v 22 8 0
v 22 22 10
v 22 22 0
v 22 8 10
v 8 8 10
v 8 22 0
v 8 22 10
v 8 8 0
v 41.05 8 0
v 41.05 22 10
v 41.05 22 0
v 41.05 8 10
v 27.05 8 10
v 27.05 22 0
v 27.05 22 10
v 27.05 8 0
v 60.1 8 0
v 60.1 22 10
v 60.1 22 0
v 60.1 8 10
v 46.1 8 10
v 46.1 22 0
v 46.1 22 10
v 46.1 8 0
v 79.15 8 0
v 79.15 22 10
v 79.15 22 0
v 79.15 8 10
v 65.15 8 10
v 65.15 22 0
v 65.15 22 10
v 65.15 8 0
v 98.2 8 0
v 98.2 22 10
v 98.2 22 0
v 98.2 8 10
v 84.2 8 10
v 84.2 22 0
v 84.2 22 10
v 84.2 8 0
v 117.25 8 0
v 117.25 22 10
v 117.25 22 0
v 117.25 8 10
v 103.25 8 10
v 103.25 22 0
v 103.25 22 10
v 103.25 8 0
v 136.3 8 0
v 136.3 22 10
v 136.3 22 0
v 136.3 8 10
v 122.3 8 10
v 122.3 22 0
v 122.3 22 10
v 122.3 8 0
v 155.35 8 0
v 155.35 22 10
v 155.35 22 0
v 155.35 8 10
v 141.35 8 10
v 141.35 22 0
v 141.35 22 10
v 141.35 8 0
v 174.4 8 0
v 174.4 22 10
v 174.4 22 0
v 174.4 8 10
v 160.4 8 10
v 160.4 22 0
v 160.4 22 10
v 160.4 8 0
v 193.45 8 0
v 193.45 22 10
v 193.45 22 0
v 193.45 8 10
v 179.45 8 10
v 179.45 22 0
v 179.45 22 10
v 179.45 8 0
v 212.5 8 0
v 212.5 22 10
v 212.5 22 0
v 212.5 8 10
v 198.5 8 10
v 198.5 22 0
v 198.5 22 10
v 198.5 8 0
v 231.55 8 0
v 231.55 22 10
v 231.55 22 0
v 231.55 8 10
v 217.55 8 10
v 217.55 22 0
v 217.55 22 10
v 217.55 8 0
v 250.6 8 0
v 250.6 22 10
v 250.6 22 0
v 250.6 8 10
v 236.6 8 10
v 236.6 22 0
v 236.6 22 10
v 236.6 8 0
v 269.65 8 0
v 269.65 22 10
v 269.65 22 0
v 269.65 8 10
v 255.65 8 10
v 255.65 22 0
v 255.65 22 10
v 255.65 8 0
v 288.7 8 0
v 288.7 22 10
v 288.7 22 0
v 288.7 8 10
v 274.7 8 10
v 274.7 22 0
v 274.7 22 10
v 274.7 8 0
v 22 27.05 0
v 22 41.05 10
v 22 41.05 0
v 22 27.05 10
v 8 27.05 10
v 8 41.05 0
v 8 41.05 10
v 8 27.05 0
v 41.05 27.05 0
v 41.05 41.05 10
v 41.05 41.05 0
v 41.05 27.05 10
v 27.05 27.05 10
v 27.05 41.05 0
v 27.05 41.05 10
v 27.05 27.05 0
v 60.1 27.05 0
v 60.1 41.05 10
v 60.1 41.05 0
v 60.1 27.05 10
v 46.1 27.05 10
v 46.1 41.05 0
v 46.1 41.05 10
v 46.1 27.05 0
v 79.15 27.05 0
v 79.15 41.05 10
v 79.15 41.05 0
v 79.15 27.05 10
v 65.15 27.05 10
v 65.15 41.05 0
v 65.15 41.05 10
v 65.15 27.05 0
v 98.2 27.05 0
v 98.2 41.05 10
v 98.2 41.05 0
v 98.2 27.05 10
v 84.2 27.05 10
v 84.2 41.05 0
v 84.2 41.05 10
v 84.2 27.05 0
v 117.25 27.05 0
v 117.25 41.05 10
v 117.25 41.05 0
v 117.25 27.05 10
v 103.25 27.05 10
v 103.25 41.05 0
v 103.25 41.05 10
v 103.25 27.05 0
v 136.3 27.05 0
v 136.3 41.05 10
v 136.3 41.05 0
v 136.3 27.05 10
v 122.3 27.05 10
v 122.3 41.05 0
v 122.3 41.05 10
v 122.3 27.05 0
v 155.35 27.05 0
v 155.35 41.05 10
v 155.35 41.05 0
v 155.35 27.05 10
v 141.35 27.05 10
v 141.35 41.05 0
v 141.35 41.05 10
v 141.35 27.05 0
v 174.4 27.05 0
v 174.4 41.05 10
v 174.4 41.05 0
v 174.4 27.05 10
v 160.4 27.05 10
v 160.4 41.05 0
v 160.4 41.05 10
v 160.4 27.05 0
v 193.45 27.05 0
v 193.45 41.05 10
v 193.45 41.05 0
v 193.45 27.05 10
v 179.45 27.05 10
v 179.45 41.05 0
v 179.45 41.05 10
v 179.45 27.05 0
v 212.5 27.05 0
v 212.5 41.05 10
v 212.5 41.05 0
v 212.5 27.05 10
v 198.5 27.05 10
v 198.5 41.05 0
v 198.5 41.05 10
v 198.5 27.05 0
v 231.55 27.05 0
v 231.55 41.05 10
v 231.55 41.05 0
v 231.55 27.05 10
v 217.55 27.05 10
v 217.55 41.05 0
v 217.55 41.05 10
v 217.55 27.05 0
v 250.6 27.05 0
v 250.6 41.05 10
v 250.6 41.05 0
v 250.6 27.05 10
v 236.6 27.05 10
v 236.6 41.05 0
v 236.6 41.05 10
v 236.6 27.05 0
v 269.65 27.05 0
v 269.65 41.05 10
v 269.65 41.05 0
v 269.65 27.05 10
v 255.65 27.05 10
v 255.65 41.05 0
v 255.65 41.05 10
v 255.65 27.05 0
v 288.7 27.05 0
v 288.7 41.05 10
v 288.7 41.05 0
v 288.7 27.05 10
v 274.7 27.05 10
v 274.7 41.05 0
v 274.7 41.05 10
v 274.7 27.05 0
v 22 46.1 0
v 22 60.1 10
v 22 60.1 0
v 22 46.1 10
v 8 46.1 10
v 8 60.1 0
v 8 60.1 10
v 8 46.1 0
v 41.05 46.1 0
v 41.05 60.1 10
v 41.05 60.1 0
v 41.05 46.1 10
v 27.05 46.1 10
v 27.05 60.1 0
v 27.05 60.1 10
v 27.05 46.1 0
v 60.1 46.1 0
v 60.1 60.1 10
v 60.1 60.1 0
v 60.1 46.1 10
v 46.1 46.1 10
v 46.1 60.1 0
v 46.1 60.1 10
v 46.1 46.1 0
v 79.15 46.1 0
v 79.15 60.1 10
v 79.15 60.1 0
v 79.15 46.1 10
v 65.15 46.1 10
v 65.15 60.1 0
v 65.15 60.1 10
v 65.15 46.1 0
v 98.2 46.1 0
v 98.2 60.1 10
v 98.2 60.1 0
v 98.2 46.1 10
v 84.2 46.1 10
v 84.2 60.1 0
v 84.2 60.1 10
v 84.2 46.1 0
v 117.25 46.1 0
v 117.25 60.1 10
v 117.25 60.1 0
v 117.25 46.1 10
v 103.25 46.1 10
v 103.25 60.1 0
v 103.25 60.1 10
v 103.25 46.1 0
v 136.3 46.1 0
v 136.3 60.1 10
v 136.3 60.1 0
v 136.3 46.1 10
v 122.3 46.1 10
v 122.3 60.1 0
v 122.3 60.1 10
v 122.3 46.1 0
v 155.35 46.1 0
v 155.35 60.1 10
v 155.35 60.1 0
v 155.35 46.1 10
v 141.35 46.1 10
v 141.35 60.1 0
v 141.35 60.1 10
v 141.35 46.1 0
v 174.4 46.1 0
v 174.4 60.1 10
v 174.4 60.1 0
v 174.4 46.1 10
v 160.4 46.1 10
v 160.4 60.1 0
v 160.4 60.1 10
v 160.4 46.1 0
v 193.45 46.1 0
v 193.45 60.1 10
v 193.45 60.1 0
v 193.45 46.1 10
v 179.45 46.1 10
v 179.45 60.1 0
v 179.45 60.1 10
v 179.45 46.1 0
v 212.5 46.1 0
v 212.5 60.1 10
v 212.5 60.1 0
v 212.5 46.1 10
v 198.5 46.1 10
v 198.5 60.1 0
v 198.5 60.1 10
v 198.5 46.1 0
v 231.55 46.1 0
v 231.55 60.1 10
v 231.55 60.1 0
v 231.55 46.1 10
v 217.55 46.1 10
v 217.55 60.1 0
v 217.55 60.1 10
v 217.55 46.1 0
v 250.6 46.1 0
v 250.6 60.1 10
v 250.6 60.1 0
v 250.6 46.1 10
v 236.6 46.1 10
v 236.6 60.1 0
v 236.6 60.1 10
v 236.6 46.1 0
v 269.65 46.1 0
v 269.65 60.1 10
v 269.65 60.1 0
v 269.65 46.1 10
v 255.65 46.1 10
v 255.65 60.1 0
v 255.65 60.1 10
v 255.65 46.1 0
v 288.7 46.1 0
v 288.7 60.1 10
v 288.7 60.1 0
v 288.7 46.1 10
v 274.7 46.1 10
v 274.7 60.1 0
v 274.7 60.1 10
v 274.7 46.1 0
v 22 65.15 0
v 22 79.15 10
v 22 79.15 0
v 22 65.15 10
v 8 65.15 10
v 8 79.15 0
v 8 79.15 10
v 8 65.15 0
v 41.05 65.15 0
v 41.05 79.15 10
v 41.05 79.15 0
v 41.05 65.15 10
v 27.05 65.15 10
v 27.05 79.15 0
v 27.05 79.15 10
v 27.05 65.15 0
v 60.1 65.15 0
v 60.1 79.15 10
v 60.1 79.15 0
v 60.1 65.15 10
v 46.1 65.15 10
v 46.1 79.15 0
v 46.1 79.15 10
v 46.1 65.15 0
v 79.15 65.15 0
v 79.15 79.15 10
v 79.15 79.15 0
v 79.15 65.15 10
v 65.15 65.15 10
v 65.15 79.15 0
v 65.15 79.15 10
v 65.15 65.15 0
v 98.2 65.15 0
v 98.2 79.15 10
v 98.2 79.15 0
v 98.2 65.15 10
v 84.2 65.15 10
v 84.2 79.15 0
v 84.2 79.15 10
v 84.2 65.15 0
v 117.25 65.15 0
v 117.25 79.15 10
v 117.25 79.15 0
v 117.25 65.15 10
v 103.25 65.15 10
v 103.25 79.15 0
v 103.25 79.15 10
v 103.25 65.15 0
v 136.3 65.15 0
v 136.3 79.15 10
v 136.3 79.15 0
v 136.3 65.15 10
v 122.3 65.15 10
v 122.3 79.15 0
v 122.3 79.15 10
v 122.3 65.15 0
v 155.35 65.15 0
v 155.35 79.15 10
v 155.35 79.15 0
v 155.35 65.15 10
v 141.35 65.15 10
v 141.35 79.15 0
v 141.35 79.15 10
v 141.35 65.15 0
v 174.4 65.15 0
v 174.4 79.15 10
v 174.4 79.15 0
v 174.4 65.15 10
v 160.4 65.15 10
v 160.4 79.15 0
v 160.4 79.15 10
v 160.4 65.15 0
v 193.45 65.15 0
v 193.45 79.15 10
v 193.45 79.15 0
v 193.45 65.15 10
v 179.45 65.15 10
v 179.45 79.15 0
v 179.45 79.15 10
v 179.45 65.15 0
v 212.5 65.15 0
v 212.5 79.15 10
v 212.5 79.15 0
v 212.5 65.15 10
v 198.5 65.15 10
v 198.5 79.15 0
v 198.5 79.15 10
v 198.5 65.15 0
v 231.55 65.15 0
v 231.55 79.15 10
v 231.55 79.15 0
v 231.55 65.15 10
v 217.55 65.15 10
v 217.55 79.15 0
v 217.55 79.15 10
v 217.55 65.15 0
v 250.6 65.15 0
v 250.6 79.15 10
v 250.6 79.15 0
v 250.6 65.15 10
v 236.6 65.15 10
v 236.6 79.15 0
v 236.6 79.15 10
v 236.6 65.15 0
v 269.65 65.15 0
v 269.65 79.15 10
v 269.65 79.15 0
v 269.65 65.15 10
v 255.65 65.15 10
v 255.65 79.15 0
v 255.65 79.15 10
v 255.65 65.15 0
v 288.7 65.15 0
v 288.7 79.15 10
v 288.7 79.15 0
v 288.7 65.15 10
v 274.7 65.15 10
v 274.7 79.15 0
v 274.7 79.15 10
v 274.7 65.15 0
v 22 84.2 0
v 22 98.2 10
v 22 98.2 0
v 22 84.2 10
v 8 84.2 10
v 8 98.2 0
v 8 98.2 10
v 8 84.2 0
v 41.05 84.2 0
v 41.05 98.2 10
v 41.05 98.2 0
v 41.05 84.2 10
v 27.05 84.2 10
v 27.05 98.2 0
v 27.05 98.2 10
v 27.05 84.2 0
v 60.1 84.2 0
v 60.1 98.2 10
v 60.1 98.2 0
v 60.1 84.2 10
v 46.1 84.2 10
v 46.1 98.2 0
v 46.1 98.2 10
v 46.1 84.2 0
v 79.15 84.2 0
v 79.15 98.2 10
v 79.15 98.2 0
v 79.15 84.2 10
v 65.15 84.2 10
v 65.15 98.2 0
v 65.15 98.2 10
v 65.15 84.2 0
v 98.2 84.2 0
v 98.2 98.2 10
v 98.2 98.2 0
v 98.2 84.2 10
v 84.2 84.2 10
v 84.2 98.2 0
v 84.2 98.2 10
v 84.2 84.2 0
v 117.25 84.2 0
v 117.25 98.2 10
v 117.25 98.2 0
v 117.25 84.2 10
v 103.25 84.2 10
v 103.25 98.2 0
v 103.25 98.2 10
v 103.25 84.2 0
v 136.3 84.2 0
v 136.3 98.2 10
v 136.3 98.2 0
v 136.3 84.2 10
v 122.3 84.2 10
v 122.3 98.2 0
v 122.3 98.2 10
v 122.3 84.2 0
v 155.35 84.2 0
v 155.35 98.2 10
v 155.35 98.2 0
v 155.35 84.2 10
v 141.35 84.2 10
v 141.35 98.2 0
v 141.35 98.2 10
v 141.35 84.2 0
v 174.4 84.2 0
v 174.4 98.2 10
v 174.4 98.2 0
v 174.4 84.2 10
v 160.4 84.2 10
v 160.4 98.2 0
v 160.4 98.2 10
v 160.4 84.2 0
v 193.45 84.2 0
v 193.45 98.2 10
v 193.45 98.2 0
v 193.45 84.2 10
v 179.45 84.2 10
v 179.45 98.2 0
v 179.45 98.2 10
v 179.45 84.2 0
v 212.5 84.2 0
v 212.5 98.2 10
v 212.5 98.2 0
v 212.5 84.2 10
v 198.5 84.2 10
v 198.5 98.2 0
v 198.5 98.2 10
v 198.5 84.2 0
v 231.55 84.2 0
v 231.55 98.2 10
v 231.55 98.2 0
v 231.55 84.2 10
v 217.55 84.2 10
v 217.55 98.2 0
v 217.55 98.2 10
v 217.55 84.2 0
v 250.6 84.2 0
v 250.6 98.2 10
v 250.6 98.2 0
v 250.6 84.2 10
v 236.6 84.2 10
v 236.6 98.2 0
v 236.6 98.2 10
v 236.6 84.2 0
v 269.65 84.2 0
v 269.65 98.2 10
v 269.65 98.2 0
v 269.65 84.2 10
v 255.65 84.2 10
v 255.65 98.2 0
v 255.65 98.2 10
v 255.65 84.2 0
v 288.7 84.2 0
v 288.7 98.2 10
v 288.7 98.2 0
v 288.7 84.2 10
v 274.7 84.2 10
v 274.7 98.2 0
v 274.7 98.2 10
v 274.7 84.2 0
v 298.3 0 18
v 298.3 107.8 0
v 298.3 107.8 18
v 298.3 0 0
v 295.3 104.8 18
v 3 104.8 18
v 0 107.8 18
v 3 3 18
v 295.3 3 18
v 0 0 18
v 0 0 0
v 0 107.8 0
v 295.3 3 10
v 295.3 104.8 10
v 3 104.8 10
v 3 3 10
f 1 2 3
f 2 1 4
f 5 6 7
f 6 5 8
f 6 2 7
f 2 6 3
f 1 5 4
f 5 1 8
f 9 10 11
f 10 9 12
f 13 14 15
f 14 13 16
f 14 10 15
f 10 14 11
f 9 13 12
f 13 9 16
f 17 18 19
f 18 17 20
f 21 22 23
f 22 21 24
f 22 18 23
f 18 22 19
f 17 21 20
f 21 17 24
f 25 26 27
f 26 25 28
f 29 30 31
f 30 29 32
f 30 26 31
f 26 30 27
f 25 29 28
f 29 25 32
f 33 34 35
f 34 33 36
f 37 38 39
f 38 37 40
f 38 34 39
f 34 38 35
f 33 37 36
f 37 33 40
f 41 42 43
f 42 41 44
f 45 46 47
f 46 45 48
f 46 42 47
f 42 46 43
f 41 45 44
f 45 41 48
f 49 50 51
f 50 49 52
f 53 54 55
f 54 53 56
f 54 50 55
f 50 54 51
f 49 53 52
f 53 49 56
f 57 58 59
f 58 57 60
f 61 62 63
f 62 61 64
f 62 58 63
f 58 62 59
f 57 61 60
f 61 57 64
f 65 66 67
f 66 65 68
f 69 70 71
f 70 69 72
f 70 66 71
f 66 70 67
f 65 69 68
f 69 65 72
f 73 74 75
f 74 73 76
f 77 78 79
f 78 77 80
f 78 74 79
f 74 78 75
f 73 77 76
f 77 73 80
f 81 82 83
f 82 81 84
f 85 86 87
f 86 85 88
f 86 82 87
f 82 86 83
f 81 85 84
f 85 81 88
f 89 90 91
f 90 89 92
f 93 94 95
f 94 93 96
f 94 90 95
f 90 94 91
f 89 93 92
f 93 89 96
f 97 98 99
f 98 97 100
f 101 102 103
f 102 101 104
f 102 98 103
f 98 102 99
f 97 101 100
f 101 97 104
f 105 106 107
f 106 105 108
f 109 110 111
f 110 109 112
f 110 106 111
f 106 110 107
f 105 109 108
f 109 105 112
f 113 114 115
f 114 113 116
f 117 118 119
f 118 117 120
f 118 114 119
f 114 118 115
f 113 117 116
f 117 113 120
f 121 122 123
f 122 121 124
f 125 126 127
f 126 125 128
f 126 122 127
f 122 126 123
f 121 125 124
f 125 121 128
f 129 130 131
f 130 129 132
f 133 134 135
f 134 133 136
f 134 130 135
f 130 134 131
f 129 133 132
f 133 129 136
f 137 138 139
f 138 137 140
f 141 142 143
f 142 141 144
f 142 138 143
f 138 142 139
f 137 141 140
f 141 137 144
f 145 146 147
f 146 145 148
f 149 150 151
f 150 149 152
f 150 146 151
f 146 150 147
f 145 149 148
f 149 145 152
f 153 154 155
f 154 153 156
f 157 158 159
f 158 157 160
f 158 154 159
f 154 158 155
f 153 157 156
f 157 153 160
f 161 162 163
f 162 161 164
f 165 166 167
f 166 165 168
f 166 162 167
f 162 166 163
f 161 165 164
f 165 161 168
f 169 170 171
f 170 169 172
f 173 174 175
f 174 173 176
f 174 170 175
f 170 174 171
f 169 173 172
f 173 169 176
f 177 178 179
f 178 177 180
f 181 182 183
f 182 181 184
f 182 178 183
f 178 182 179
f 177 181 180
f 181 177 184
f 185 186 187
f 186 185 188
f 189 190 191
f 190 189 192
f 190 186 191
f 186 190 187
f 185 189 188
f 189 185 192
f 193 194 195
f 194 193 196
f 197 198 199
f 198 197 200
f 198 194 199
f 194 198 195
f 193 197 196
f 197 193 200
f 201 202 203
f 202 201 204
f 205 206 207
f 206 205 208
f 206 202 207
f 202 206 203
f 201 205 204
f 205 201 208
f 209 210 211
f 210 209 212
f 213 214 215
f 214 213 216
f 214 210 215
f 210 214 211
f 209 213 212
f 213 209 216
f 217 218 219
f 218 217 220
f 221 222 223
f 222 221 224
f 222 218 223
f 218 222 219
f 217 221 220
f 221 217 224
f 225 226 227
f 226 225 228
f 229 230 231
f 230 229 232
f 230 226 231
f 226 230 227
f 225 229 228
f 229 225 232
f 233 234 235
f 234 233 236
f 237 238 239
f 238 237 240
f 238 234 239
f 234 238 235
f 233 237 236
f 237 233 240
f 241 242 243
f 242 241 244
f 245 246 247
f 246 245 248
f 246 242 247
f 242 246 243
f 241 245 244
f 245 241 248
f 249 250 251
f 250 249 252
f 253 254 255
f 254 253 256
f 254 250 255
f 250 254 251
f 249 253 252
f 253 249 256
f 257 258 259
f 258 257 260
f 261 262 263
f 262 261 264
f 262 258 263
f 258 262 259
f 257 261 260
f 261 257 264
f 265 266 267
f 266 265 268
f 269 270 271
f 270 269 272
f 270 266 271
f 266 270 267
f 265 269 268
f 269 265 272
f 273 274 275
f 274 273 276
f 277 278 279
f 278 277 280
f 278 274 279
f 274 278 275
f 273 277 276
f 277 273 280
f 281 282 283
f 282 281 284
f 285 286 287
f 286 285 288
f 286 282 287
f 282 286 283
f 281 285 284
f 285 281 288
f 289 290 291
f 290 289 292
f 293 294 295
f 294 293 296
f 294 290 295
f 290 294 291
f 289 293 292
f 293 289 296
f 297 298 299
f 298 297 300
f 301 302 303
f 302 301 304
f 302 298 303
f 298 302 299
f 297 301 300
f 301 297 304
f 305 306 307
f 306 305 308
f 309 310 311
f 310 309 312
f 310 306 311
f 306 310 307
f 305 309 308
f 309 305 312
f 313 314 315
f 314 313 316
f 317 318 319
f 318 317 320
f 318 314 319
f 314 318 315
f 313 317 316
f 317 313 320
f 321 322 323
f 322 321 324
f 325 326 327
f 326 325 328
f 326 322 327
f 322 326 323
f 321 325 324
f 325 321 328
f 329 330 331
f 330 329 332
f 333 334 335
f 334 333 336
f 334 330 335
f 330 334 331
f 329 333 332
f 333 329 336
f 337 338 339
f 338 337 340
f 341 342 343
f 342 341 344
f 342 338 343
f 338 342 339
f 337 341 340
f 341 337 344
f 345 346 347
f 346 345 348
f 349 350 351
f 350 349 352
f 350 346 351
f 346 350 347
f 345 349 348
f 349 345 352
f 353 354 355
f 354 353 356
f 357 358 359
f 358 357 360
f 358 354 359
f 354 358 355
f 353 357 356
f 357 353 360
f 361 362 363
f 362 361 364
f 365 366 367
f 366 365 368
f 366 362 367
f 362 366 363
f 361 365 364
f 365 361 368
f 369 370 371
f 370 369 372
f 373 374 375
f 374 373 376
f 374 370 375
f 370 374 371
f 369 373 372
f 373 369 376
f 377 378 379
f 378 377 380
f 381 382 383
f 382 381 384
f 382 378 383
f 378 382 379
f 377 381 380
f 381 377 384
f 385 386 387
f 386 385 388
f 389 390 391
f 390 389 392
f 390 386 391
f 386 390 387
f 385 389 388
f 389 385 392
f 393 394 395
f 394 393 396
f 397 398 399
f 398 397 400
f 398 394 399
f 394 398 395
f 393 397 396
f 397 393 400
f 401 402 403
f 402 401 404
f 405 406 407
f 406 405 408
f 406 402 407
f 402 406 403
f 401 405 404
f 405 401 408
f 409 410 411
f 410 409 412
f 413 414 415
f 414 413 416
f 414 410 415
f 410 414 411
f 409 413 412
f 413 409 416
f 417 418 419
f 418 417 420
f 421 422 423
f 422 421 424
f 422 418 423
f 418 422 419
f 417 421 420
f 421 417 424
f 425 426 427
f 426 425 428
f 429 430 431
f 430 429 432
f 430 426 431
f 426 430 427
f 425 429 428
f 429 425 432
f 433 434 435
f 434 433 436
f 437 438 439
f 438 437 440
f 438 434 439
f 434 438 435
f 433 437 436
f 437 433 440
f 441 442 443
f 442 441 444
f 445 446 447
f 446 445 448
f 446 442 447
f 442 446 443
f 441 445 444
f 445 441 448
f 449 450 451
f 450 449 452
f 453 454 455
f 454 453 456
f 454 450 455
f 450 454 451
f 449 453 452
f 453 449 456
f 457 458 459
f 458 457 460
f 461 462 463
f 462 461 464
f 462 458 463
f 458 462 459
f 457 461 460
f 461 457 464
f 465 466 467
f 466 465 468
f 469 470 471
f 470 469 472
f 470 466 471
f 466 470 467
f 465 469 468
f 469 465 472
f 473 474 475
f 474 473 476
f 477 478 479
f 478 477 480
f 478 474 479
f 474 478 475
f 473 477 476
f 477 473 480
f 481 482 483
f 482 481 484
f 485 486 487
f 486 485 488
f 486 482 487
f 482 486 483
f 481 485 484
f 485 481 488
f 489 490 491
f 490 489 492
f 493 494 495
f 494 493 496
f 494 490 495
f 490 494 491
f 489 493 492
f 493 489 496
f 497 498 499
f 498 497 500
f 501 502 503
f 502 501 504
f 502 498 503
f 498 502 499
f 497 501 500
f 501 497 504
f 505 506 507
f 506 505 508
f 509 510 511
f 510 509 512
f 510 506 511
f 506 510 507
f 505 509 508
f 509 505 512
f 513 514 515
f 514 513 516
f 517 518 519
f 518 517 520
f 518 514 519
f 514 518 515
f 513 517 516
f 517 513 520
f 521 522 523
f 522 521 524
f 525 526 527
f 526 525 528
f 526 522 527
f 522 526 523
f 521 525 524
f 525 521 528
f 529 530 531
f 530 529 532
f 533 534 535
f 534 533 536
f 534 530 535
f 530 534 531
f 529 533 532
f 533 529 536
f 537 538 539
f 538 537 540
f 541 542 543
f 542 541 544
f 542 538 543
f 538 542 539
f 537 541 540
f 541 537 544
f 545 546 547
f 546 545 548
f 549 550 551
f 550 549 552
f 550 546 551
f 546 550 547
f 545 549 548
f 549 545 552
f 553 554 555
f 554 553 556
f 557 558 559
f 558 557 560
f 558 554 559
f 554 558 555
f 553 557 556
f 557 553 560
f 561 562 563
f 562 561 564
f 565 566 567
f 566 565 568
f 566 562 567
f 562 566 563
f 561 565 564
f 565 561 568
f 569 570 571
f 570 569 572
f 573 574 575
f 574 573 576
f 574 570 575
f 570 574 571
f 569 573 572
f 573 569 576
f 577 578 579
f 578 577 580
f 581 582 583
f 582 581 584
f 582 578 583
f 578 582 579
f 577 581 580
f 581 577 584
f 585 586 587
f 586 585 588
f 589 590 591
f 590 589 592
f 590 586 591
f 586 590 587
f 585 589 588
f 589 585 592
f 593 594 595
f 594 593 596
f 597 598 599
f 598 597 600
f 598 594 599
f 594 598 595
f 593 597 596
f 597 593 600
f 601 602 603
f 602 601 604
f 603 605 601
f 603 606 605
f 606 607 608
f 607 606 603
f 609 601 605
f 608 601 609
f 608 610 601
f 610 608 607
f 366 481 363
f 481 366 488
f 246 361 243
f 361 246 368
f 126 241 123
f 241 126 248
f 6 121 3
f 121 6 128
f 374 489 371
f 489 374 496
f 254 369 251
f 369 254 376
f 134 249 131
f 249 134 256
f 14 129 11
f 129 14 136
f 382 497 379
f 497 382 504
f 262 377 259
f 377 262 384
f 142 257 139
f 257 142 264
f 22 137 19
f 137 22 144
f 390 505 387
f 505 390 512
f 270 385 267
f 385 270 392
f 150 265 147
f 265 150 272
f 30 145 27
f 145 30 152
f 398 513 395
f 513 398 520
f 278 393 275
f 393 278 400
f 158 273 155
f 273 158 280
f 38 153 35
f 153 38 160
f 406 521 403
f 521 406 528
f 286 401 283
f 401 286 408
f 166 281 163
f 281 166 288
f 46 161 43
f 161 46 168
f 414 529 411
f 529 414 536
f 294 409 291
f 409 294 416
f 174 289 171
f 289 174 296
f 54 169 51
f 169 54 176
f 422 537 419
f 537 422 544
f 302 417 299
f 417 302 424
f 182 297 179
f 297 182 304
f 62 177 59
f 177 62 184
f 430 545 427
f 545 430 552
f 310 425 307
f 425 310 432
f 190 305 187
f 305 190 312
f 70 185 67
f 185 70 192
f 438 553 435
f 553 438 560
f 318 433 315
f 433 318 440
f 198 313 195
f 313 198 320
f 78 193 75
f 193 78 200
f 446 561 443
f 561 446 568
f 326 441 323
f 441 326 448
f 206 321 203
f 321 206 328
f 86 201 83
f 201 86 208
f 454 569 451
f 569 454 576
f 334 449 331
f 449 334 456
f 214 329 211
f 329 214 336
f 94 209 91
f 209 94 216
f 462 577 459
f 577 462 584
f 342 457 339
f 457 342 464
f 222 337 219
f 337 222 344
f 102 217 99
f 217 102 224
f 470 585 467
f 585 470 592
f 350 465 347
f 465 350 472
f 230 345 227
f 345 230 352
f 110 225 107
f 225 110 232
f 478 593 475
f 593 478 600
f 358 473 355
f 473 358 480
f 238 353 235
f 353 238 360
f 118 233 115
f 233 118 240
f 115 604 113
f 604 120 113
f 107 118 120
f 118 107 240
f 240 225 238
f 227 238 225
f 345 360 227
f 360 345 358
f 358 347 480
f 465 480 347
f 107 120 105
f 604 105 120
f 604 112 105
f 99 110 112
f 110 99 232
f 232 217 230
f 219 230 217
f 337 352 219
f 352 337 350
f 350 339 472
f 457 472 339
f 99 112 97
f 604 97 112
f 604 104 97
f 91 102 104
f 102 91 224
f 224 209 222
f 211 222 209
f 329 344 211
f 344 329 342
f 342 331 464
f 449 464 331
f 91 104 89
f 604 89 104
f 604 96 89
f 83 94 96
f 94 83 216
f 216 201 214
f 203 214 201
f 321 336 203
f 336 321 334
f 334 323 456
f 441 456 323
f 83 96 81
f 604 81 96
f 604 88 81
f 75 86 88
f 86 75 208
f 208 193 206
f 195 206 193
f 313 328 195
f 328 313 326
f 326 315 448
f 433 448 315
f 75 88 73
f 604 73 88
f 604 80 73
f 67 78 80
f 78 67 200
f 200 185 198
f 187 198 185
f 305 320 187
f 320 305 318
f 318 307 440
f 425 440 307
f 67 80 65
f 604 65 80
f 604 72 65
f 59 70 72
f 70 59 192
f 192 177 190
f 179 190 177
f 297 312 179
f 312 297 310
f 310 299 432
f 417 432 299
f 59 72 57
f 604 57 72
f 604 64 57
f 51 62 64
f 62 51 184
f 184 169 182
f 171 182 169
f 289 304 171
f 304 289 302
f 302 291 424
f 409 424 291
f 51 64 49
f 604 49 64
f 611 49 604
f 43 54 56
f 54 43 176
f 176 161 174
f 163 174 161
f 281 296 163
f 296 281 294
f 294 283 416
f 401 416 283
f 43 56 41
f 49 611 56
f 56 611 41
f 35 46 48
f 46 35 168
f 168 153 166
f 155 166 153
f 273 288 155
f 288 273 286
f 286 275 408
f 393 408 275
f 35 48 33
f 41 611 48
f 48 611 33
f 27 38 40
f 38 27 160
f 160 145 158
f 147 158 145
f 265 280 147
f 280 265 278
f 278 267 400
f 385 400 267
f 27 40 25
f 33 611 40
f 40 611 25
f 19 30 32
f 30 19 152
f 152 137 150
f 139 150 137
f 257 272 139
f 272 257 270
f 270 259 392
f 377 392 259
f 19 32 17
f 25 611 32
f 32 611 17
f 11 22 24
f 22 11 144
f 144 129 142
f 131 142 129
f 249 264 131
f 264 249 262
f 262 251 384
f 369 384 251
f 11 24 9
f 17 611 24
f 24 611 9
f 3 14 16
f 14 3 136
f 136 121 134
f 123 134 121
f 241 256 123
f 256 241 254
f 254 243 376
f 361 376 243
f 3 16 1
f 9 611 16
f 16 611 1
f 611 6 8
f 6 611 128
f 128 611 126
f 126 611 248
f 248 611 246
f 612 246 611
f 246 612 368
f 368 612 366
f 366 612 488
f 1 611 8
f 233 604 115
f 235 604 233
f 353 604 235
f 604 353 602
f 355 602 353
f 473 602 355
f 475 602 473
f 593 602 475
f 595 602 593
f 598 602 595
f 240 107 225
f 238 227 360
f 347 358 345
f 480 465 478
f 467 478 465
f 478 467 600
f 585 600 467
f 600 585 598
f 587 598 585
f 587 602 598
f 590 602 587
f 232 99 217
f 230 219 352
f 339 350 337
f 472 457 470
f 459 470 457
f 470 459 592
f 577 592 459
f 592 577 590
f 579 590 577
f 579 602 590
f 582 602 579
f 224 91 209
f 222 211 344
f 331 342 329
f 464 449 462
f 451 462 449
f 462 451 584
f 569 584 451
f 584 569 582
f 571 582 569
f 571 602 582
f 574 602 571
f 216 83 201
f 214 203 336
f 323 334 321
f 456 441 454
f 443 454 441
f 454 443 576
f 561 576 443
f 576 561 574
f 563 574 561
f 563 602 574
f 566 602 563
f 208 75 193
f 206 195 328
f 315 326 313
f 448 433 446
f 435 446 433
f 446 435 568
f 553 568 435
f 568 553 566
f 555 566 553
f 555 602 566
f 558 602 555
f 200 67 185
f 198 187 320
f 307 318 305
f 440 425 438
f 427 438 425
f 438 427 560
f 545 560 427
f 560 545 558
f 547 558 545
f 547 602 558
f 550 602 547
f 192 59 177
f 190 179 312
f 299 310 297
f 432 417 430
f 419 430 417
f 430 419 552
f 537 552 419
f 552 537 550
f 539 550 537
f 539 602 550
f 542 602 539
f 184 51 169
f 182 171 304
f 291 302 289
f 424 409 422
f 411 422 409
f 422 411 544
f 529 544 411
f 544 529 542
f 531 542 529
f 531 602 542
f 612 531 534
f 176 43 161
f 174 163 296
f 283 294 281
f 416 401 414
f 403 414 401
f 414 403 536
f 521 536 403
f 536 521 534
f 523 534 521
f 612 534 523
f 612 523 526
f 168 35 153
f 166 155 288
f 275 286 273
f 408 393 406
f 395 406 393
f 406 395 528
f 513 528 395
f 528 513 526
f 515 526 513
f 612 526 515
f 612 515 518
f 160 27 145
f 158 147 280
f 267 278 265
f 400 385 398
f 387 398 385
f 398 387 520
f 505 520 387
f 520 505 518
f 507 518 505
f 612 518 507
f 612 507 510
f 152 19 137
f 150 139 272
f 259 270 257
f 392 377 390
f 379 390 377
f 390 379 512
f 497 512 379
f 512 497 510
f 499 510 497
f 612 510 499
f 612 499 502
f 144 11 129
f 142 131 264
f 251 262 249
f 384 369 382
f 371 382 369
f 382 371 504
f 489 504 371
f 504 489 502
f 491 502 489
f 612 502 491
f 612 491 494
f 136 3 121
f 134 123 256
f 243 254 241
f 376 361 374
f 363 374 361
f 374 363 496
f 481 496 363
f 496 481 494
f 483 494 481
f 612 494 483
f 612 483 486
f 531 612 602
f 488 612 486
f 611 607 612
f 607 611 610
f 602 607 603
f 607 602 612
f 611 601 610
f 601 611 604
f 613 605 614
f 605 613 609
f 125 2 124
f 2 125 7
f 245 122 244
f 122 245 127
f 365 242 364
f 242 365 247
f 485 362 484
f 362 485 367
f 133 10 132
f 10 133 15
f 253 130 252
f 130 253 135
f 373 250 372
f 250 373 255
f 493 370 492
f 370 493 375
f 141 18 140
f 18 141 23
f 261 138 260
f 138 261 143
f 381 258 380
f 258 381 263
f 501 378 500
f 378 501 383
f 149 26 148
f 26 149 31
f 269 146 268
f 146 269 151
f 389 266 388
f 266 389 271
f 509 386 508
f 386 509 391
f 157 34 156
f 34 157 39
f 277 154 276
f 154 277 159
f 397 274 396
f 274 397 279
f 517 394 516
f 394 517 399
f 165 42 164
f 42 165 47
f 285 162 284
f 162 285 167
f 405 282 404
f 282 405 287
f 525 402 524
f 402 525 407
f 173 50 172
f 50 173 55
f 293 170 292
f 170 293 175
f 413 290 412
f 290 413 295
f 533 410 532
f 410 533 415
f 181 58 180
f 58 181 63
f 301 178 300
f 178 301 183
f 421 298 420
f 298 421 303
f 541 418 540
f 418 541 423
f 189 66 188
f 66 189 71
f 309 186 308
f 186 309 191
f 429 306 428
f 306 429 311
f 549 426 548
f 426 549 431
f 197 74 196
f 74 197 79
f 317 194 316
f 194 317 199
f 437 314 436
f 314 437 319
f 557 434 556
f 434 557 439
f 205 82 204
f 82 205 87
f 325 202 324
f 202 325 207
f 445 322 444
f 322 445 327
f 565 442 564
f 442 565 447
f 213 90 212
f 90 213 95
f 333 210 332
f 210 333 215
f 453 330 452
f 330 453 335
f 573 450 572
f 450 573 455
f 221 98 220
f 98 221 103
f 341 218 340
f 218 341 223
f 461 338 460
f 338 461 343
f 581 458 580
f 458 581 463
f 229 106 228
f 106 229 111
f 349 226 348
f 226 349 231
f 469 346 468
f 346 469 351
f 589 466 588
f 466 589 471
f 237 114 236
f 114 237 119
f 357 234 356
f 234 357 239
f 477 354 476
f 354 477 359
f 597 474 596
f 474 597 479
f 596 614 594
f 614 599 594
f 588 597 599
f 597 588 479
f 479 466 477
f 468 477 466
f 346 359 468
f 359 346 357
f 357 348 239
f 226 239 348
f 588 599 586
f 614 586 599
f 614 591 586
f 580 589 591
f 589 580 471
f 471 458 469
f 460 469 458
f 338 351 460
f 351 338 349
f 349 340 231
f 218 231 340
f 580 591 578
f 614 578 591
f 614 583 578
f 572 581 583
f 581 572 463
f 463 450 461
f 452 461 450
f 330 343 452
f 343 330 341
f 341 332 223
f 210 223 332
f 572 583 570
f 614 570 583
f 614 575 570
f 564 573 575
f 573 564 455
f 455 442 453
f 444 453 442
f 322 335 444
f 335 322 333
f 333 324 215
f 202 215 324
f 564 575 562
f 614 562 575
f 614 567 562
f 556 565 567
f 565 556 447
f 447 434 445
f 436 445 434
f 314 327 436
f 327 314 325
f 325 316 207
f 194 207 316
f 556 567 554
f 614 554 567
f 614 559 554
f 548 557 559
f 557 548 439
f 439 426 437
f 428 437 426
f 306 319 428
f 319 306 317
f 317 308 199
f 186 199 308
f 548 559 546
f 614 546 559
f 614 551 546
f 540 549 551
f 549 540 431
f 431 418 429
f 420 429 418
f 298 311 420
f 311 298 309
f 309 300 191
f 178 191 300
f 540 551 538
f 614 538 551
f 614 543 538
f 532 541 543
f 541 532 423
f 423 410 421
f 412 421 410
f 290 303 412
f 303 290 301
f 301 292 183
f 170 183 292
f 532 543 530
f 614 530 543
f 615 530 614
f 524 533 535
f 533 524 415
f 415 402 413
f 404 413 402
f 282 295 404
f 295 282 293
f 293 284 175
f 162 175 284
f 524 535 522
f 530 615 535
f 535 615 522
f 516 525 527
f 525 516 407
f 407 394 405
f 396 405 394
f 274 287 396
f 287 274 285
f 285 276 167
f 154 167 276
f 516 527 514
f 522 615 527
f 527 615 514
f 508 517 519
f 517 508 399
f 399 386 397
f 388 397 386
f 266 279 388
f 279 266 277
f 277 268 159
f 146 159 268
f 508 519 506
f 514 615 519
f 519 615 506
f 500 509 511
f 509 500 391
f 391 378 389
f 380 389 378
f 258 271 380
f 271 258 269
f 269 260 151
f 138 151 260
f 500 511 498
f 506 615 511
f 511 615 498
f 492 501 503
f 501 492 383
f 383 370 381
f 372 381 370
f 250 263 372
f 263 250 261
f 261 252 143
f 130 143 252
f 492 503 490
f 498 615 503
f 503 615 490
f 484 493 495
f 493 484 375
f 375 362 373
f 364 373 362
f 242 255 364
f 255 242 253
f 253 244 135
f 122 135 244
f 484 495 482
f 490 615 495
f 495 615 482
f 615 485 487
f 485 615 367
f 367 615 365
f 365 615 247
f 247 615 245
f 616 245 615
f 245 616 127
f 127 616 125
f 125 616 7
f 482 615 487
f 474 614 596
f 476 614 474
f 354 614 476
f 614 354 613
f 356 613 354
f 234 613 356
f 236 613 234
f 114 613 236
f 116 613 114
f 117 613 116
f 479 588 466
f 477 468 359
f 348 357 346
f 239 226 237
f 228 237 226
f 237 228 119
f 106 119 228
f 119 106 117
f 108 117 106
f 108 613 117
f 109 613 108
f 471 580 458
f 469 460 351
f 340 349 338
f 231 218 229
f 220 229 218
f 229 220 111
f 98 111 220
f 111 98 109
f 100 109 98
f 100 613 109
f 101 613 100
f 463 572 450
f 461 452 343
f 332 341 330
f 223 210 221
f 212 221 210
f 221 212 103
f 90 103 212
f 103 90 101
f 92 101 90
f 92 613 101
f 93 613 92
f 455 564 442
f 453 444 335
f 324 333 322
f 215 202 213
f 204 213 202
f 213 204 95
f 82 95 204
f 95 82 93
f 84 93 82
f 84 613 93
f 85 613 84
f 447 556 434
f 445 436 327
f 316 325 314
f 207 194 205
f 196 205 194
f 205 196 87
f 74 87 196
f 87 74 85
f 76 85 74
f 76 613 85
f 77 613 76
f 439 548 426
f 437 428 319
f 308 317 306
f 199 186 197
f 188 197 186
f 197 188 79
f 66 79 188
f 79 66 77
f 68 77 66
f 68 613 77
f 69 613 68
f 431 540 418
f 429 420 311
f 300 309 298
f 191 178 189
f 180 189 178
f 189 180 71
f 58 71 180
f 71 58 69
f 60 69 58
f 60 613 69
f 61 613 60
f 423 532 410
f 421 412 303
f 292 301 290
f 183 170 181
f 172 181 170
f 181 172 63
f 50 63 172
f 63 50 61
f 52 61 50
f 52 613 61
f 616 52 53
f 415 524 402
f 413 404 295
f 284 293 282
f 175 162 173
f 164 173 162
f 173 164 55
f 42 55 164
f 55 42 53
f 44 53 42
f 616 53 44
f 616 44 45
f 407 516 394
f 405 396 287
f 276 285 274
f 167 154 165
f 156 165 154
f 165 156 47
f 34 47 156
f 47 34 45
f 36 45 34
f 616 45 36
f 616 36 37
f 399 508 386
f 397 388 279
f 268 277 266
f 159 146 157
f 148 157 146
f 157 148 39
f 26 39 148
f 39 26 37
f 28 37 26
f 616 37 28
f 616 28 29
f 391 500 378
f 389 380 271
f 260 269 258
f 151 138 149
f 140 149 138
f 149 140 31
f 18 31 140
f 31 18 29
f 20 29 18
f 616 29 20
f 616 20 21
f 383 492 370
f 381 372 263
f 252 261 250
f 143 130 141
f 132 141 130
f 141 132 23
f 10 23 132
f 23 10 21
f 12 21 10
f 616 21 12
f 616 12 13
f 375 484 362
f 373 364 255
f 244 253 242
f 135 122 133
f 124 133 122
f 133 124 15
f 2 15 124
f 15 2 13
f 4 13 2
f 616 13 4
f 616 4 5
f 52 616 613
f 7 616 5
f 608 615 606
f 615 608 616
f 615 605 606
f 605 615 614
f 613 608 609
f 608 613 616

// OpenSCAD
// Generated keyboard case
// Layout: 5x15
// Switch type: Cherry MX
// Optimization: none

// Parameters
case_width = 298.30;
case_height = 107.80;
case_depth = 18.00;
wall_thickness = 3.00;
base_height = 10.00;
switch_cutout_size = 14.00;
key_spacing = 19.05;

module keyboard_case() {
    difference() {
        // Outer shell
        translate([0, 0, 0])
            cube([case_width, case_height, case_depth]);

        // Inner cavity
        translate([wall_thickness, wall_thickness, base_height])
            cube([case_width - 2*wall_thickness, 
                  case_height - 2*wall_thickness, 
                  case_depth - base_height + 1]);

        // Switch cutouts
        translate([wall_thickness + 5 - 0.00, wall_thickness + 5 - 0.00, -1])
            switch_plate();
    }
}

module switch_plate() {
    translate([0.00, 0.00, 0])
        cube([switch_cutout_size, switch_cutout_size, base_height + 2]);
    translate([19.05, 0.00, 0])
        cube([switch_cutout_size, switch_cutout_size, base_height + 2]);
    translate([38.10, 0.00, 0])
        cube([switch_cutout_size, switch_cutout_size, base_height + 2]);
    translate([57.15, 0.00, 0])
        cube([switch_cutout_size, switch_cutout_size, base_height + 2]);
    translate([76.20, 0.00, 0])
        cube([switch_cutout_size, switch_cutout_size, base_height + 2]);
    translate([95.25, 0.00, 0])
        cube([switch_cutout_size, switch_cutout_size, base_height + 2]);
    translate([114.30, 0.00, 0])
        cube([switch_cutout_size, switch_cutout_size, base_height + 2]);
    translate([133.35, 0.00, 0])
        cube([switch_cutout_size, switch_cutout_size, base_height + 2]);
    translate([152.40, 0.00, 0])
        cube([switch_cutout_size, switch_cutout_size, base_height + 2]);
    translate([171.45, 0.00, 0])
        cube([switch_cutout_size, switch_cutout_size, base_height + 2]);
    translate([190.50, 0.00, 0])
        cube([switch_cutout_size, switch_cutout_size, base_height + 2]);
    translate([209.55, 0.00, 0])
        cube([switch_cutout_size, switch_cutout_size, base_height + 2]);
    translate([228.60, 0.00, 0])
        cube([switch_cutout_size, switch_cutout_size, base_height + 2]);
    translate([247.65, 0.00, 0])
        cube([switch_cutout_size, switch_cutout_size, base_height + 2]);
    translate([266.70, 0.00, 0])
        cube([switch_cutout_size, switch_cutout_size, base_height + 2]);
    translate([0.00, 19.05, 0])
        cube([switch_cutout_size, switch_cutout_size, base_height + 2]);
    translate([19.05, 19.05, 0])
        cube([switch_cutout_size, switch_cutout_size, base_height + 2]);
    translate([38.10, 19.05, 0])
        cube([switch_cutout_size, switch_cutout_size, base_height + 2]);
    translate([57.15, 19.05, 0])
        cube([switch_cutout_size, switch_cutout_size, base_height + 2]);
    translate([76.20, 19.05, 0])
        cube([switch_cutout_size, switch_cutout_size, base_height + 2]);
    translate([95.25, 19.05, 0])
        cube([switch_cutout_size, switch_cutout_size, base_height + 2]);
    translate([114.30, 19.05, 0])
        cube([switch_cutout_size, switch_cutout_size, base_height + 2]);
    translate([133.35, 19.05, 0])
        cube([switch_cutout_size, switch_cutout_size, base_height + 2]);
    translate([152.40, 19.05, 0])
        cube([switch_cutout_size, switch_cutout_size, base_height + 2]);
    translate([171.45, 19.05, 0])
        cube([switch_cutout_size, switch_cutout_size, base_height + 2]);
    translate([190.50, 19.05, 0])
        cube([switch_cutout_size, switch_cutout_size, base_height + 2]);
    translate([209.55, 19.05, 0])
        cube([switch_cutout_size, switch_cutout_size, base_height + 2]);
    translate([228.60, 19.05, 0])
        cube([switch_cutout_size, switch_cutout_size, base_height + 2]);
    translate([247.65, 19.05, 0])
        cube([switch_cutout_size, switch_cutout_size, base_height + 2]);
    translate([266.70, 19.05, 0])
        cube([switch_cutout_size, switch_cutout_size, base_height + 2]);
    translate([0.00, 38.10, 0])
        cube([switch_cutout_size, switch_cutout_size, base_height + 2]);
    translate([19.05, 38.10, 0])
        cube([switch_cutout_size, switch_cutout_size, base_height + 2]);
    translate([38.10, 38.10, 0])
        cube([switch_cutout_size, switch_cutout_size, base_height + 2]);
    translate([57.15, 38.10, 0])
        cube([switch_cutout_size, switch_cutout_size, base_height + 2]);
    translate([76.20, 38.10, 0])
        cube([switch_cutout_size, switch_cutout_size, base_height + 2]);
    translate([95.25, 38.10, 0])
        cube([switch_cutout_size, switch_cutout_size, base_height + 2]);
    translate([114.30, 38.10, 0])
        cube([switch_cutout_size, switch_cutout_size, base_height + 2]);
    translate([133.35, 38.10, 0])
        cube([switch_cutout_size, switch_cutout_size, base_height + 2]);
    translate([152.40, 38.10, 0])
        cube([switch_cutout_size, switch_cutout_size, base_height + 2]);
    translate([171.45, 38.10, 0])
        cube([switch_cutout_size, switch_cutout_size, base_height + 2]);
    translate([190.50, 38.10, 0])
        cube([switch_cutout_size, switch_cutout_size, base_height + 2]);
    translate([209.55, 38.10, 0])
        cube([switch_cutout_size, switch_cutout_size, base_height + 2]);
    translate([228.60, 38.10, 0])
        cube([switch_cutout_size, switch_cutout_size, base_height + 2]);
    translate([247.65, 38.10, 0])
        cube([switch_cutout_size, switch_cutout_size, base_height + 2]);
    translate([266.70, 38.10, 0])
        cube([switch_cutout_size, switch_cutout_size, base_height + 2]);
    translate([0.00, 57.15, 0])
        cube([switch_cutout_size, switch_cutout_size, base_height + 2]);
    translate([19.05, 57.15, 0])
        cube([switch_cutout_size, switch_cutout_size, base_height + 2]);
    translate([38.10, 57.15, 0])
        cube([switch_cutout_size, switch_cutout_size, base_height + 2]);
    translate([57.15, 57.15, 0])
        cube([switch_cutout_size, switch_cutout_size, base_height + 2]);
    translate([76.20, 57.15, 0])
        cube([switch_cutout_size, switch_cutout_size, base_height + 2]);
    translate([95.25, 57.15, 0])
        cube([switch_cutout_size, switch_cutout_size, base_height + 2]);
    translate([114.30, 57.15, 0])
        cube([switch_cutout_size, switch_cutout_size, base_height + 2]);
    translate([133.35, 57.15, 0])
        cube([switch_cutout_size, switch_cutout_size, base_height + 2]);
    translate([152.40, 57.15, 0])
        cube([switch_cutout_size, switch_cutout_size, base_height + 2]);
    translate([171.45, 57.15, 0])
        cube([switch_cutout_size, switch_cutout_size, base_height + 2]);
    translate([190.50, 57.15, 0])
        cube([switch_cutout_size, switch_cutout_size, base_height + 2]);
    translate([209.55, 57.15, 0])
        cube([switch_cutout_size, switch_cutout_size, base_height + 2]);
    translate([228.60, 57.15, 0])
        cube([switch_cutout_size, switch_cutout_size, base_height + 2]);
    translate([247.65, 57.15, 0])
        cube([switch_cutout_size, switch_cutout_size, base_height + 2]);
    translate([266.70, 57.15, 0])
        cube([switch_cutout_size, switch_cutout_size, base_height + 2]);
    translate([0.00, 76.20, 0])
        cube([switch_cutout_size, switch_cutout_size, base_height + 2]);
    translate([19.05, 76.20, 0])
        cube([switch_cutout_size, switch_cutout_size, base_height + 2]);
    translate([38.10, 76.20, 0])
        cube([switch_cutout_size, switch_cutout_size, base_height + 2]);
    translate([57.15, 76.20, 0])
        cube([switch_cutout_size, switch_cutout_size, base_height + 2]);
    translate([76.20, 76.20, 0])
        cube([switch_cutout_size, switch_cutout_size, base_height + 2]);
    translate([95.25, 76.20, 0])
        cube([switch_cutout_size, switch_cutout_size, base_height + 2]);
    translate([114.30, 76.20, 0])
        cube([switch_cutout_size, switch_cutout_size, base_height + 2]);
    translate([133.35, 76.20, 0])
        cube([switch_cutout_size, switch_cutout_size, base_height + 2]);
    translate([152.40, 76.20, 0])
        cube([switch_cutout_size, switch_cutout_size, base_height + 2]);
    translate([171.45, 76.20, 0])
        cube([switch_cutout_size, switch_cutout_size, base_height + 2]);
    translate([190.50, 76.20, 0])
        cube([switch_cutout_size, switch_cutout_size, base_height + 2]);
    translate([209.55, 76.20, 0])
        cube([switch_cutout_size, switch_cutout_size, base_height + 2]);
    translate([228.60, 76.20, 0])
        cube([switch_cutout_size, switch_cutout_size, base_height + 2]);
    translate([247.65, 76.20, 0])
        cube([switch_cutout_size, switch_cutout_size, base_height + 2]);
    translate([266.70, 76.20, 0])
        cube([switch_cutout_size, switch_cutout_size, base_height + 2]);
}

// Generate the case
keyboard_case();
